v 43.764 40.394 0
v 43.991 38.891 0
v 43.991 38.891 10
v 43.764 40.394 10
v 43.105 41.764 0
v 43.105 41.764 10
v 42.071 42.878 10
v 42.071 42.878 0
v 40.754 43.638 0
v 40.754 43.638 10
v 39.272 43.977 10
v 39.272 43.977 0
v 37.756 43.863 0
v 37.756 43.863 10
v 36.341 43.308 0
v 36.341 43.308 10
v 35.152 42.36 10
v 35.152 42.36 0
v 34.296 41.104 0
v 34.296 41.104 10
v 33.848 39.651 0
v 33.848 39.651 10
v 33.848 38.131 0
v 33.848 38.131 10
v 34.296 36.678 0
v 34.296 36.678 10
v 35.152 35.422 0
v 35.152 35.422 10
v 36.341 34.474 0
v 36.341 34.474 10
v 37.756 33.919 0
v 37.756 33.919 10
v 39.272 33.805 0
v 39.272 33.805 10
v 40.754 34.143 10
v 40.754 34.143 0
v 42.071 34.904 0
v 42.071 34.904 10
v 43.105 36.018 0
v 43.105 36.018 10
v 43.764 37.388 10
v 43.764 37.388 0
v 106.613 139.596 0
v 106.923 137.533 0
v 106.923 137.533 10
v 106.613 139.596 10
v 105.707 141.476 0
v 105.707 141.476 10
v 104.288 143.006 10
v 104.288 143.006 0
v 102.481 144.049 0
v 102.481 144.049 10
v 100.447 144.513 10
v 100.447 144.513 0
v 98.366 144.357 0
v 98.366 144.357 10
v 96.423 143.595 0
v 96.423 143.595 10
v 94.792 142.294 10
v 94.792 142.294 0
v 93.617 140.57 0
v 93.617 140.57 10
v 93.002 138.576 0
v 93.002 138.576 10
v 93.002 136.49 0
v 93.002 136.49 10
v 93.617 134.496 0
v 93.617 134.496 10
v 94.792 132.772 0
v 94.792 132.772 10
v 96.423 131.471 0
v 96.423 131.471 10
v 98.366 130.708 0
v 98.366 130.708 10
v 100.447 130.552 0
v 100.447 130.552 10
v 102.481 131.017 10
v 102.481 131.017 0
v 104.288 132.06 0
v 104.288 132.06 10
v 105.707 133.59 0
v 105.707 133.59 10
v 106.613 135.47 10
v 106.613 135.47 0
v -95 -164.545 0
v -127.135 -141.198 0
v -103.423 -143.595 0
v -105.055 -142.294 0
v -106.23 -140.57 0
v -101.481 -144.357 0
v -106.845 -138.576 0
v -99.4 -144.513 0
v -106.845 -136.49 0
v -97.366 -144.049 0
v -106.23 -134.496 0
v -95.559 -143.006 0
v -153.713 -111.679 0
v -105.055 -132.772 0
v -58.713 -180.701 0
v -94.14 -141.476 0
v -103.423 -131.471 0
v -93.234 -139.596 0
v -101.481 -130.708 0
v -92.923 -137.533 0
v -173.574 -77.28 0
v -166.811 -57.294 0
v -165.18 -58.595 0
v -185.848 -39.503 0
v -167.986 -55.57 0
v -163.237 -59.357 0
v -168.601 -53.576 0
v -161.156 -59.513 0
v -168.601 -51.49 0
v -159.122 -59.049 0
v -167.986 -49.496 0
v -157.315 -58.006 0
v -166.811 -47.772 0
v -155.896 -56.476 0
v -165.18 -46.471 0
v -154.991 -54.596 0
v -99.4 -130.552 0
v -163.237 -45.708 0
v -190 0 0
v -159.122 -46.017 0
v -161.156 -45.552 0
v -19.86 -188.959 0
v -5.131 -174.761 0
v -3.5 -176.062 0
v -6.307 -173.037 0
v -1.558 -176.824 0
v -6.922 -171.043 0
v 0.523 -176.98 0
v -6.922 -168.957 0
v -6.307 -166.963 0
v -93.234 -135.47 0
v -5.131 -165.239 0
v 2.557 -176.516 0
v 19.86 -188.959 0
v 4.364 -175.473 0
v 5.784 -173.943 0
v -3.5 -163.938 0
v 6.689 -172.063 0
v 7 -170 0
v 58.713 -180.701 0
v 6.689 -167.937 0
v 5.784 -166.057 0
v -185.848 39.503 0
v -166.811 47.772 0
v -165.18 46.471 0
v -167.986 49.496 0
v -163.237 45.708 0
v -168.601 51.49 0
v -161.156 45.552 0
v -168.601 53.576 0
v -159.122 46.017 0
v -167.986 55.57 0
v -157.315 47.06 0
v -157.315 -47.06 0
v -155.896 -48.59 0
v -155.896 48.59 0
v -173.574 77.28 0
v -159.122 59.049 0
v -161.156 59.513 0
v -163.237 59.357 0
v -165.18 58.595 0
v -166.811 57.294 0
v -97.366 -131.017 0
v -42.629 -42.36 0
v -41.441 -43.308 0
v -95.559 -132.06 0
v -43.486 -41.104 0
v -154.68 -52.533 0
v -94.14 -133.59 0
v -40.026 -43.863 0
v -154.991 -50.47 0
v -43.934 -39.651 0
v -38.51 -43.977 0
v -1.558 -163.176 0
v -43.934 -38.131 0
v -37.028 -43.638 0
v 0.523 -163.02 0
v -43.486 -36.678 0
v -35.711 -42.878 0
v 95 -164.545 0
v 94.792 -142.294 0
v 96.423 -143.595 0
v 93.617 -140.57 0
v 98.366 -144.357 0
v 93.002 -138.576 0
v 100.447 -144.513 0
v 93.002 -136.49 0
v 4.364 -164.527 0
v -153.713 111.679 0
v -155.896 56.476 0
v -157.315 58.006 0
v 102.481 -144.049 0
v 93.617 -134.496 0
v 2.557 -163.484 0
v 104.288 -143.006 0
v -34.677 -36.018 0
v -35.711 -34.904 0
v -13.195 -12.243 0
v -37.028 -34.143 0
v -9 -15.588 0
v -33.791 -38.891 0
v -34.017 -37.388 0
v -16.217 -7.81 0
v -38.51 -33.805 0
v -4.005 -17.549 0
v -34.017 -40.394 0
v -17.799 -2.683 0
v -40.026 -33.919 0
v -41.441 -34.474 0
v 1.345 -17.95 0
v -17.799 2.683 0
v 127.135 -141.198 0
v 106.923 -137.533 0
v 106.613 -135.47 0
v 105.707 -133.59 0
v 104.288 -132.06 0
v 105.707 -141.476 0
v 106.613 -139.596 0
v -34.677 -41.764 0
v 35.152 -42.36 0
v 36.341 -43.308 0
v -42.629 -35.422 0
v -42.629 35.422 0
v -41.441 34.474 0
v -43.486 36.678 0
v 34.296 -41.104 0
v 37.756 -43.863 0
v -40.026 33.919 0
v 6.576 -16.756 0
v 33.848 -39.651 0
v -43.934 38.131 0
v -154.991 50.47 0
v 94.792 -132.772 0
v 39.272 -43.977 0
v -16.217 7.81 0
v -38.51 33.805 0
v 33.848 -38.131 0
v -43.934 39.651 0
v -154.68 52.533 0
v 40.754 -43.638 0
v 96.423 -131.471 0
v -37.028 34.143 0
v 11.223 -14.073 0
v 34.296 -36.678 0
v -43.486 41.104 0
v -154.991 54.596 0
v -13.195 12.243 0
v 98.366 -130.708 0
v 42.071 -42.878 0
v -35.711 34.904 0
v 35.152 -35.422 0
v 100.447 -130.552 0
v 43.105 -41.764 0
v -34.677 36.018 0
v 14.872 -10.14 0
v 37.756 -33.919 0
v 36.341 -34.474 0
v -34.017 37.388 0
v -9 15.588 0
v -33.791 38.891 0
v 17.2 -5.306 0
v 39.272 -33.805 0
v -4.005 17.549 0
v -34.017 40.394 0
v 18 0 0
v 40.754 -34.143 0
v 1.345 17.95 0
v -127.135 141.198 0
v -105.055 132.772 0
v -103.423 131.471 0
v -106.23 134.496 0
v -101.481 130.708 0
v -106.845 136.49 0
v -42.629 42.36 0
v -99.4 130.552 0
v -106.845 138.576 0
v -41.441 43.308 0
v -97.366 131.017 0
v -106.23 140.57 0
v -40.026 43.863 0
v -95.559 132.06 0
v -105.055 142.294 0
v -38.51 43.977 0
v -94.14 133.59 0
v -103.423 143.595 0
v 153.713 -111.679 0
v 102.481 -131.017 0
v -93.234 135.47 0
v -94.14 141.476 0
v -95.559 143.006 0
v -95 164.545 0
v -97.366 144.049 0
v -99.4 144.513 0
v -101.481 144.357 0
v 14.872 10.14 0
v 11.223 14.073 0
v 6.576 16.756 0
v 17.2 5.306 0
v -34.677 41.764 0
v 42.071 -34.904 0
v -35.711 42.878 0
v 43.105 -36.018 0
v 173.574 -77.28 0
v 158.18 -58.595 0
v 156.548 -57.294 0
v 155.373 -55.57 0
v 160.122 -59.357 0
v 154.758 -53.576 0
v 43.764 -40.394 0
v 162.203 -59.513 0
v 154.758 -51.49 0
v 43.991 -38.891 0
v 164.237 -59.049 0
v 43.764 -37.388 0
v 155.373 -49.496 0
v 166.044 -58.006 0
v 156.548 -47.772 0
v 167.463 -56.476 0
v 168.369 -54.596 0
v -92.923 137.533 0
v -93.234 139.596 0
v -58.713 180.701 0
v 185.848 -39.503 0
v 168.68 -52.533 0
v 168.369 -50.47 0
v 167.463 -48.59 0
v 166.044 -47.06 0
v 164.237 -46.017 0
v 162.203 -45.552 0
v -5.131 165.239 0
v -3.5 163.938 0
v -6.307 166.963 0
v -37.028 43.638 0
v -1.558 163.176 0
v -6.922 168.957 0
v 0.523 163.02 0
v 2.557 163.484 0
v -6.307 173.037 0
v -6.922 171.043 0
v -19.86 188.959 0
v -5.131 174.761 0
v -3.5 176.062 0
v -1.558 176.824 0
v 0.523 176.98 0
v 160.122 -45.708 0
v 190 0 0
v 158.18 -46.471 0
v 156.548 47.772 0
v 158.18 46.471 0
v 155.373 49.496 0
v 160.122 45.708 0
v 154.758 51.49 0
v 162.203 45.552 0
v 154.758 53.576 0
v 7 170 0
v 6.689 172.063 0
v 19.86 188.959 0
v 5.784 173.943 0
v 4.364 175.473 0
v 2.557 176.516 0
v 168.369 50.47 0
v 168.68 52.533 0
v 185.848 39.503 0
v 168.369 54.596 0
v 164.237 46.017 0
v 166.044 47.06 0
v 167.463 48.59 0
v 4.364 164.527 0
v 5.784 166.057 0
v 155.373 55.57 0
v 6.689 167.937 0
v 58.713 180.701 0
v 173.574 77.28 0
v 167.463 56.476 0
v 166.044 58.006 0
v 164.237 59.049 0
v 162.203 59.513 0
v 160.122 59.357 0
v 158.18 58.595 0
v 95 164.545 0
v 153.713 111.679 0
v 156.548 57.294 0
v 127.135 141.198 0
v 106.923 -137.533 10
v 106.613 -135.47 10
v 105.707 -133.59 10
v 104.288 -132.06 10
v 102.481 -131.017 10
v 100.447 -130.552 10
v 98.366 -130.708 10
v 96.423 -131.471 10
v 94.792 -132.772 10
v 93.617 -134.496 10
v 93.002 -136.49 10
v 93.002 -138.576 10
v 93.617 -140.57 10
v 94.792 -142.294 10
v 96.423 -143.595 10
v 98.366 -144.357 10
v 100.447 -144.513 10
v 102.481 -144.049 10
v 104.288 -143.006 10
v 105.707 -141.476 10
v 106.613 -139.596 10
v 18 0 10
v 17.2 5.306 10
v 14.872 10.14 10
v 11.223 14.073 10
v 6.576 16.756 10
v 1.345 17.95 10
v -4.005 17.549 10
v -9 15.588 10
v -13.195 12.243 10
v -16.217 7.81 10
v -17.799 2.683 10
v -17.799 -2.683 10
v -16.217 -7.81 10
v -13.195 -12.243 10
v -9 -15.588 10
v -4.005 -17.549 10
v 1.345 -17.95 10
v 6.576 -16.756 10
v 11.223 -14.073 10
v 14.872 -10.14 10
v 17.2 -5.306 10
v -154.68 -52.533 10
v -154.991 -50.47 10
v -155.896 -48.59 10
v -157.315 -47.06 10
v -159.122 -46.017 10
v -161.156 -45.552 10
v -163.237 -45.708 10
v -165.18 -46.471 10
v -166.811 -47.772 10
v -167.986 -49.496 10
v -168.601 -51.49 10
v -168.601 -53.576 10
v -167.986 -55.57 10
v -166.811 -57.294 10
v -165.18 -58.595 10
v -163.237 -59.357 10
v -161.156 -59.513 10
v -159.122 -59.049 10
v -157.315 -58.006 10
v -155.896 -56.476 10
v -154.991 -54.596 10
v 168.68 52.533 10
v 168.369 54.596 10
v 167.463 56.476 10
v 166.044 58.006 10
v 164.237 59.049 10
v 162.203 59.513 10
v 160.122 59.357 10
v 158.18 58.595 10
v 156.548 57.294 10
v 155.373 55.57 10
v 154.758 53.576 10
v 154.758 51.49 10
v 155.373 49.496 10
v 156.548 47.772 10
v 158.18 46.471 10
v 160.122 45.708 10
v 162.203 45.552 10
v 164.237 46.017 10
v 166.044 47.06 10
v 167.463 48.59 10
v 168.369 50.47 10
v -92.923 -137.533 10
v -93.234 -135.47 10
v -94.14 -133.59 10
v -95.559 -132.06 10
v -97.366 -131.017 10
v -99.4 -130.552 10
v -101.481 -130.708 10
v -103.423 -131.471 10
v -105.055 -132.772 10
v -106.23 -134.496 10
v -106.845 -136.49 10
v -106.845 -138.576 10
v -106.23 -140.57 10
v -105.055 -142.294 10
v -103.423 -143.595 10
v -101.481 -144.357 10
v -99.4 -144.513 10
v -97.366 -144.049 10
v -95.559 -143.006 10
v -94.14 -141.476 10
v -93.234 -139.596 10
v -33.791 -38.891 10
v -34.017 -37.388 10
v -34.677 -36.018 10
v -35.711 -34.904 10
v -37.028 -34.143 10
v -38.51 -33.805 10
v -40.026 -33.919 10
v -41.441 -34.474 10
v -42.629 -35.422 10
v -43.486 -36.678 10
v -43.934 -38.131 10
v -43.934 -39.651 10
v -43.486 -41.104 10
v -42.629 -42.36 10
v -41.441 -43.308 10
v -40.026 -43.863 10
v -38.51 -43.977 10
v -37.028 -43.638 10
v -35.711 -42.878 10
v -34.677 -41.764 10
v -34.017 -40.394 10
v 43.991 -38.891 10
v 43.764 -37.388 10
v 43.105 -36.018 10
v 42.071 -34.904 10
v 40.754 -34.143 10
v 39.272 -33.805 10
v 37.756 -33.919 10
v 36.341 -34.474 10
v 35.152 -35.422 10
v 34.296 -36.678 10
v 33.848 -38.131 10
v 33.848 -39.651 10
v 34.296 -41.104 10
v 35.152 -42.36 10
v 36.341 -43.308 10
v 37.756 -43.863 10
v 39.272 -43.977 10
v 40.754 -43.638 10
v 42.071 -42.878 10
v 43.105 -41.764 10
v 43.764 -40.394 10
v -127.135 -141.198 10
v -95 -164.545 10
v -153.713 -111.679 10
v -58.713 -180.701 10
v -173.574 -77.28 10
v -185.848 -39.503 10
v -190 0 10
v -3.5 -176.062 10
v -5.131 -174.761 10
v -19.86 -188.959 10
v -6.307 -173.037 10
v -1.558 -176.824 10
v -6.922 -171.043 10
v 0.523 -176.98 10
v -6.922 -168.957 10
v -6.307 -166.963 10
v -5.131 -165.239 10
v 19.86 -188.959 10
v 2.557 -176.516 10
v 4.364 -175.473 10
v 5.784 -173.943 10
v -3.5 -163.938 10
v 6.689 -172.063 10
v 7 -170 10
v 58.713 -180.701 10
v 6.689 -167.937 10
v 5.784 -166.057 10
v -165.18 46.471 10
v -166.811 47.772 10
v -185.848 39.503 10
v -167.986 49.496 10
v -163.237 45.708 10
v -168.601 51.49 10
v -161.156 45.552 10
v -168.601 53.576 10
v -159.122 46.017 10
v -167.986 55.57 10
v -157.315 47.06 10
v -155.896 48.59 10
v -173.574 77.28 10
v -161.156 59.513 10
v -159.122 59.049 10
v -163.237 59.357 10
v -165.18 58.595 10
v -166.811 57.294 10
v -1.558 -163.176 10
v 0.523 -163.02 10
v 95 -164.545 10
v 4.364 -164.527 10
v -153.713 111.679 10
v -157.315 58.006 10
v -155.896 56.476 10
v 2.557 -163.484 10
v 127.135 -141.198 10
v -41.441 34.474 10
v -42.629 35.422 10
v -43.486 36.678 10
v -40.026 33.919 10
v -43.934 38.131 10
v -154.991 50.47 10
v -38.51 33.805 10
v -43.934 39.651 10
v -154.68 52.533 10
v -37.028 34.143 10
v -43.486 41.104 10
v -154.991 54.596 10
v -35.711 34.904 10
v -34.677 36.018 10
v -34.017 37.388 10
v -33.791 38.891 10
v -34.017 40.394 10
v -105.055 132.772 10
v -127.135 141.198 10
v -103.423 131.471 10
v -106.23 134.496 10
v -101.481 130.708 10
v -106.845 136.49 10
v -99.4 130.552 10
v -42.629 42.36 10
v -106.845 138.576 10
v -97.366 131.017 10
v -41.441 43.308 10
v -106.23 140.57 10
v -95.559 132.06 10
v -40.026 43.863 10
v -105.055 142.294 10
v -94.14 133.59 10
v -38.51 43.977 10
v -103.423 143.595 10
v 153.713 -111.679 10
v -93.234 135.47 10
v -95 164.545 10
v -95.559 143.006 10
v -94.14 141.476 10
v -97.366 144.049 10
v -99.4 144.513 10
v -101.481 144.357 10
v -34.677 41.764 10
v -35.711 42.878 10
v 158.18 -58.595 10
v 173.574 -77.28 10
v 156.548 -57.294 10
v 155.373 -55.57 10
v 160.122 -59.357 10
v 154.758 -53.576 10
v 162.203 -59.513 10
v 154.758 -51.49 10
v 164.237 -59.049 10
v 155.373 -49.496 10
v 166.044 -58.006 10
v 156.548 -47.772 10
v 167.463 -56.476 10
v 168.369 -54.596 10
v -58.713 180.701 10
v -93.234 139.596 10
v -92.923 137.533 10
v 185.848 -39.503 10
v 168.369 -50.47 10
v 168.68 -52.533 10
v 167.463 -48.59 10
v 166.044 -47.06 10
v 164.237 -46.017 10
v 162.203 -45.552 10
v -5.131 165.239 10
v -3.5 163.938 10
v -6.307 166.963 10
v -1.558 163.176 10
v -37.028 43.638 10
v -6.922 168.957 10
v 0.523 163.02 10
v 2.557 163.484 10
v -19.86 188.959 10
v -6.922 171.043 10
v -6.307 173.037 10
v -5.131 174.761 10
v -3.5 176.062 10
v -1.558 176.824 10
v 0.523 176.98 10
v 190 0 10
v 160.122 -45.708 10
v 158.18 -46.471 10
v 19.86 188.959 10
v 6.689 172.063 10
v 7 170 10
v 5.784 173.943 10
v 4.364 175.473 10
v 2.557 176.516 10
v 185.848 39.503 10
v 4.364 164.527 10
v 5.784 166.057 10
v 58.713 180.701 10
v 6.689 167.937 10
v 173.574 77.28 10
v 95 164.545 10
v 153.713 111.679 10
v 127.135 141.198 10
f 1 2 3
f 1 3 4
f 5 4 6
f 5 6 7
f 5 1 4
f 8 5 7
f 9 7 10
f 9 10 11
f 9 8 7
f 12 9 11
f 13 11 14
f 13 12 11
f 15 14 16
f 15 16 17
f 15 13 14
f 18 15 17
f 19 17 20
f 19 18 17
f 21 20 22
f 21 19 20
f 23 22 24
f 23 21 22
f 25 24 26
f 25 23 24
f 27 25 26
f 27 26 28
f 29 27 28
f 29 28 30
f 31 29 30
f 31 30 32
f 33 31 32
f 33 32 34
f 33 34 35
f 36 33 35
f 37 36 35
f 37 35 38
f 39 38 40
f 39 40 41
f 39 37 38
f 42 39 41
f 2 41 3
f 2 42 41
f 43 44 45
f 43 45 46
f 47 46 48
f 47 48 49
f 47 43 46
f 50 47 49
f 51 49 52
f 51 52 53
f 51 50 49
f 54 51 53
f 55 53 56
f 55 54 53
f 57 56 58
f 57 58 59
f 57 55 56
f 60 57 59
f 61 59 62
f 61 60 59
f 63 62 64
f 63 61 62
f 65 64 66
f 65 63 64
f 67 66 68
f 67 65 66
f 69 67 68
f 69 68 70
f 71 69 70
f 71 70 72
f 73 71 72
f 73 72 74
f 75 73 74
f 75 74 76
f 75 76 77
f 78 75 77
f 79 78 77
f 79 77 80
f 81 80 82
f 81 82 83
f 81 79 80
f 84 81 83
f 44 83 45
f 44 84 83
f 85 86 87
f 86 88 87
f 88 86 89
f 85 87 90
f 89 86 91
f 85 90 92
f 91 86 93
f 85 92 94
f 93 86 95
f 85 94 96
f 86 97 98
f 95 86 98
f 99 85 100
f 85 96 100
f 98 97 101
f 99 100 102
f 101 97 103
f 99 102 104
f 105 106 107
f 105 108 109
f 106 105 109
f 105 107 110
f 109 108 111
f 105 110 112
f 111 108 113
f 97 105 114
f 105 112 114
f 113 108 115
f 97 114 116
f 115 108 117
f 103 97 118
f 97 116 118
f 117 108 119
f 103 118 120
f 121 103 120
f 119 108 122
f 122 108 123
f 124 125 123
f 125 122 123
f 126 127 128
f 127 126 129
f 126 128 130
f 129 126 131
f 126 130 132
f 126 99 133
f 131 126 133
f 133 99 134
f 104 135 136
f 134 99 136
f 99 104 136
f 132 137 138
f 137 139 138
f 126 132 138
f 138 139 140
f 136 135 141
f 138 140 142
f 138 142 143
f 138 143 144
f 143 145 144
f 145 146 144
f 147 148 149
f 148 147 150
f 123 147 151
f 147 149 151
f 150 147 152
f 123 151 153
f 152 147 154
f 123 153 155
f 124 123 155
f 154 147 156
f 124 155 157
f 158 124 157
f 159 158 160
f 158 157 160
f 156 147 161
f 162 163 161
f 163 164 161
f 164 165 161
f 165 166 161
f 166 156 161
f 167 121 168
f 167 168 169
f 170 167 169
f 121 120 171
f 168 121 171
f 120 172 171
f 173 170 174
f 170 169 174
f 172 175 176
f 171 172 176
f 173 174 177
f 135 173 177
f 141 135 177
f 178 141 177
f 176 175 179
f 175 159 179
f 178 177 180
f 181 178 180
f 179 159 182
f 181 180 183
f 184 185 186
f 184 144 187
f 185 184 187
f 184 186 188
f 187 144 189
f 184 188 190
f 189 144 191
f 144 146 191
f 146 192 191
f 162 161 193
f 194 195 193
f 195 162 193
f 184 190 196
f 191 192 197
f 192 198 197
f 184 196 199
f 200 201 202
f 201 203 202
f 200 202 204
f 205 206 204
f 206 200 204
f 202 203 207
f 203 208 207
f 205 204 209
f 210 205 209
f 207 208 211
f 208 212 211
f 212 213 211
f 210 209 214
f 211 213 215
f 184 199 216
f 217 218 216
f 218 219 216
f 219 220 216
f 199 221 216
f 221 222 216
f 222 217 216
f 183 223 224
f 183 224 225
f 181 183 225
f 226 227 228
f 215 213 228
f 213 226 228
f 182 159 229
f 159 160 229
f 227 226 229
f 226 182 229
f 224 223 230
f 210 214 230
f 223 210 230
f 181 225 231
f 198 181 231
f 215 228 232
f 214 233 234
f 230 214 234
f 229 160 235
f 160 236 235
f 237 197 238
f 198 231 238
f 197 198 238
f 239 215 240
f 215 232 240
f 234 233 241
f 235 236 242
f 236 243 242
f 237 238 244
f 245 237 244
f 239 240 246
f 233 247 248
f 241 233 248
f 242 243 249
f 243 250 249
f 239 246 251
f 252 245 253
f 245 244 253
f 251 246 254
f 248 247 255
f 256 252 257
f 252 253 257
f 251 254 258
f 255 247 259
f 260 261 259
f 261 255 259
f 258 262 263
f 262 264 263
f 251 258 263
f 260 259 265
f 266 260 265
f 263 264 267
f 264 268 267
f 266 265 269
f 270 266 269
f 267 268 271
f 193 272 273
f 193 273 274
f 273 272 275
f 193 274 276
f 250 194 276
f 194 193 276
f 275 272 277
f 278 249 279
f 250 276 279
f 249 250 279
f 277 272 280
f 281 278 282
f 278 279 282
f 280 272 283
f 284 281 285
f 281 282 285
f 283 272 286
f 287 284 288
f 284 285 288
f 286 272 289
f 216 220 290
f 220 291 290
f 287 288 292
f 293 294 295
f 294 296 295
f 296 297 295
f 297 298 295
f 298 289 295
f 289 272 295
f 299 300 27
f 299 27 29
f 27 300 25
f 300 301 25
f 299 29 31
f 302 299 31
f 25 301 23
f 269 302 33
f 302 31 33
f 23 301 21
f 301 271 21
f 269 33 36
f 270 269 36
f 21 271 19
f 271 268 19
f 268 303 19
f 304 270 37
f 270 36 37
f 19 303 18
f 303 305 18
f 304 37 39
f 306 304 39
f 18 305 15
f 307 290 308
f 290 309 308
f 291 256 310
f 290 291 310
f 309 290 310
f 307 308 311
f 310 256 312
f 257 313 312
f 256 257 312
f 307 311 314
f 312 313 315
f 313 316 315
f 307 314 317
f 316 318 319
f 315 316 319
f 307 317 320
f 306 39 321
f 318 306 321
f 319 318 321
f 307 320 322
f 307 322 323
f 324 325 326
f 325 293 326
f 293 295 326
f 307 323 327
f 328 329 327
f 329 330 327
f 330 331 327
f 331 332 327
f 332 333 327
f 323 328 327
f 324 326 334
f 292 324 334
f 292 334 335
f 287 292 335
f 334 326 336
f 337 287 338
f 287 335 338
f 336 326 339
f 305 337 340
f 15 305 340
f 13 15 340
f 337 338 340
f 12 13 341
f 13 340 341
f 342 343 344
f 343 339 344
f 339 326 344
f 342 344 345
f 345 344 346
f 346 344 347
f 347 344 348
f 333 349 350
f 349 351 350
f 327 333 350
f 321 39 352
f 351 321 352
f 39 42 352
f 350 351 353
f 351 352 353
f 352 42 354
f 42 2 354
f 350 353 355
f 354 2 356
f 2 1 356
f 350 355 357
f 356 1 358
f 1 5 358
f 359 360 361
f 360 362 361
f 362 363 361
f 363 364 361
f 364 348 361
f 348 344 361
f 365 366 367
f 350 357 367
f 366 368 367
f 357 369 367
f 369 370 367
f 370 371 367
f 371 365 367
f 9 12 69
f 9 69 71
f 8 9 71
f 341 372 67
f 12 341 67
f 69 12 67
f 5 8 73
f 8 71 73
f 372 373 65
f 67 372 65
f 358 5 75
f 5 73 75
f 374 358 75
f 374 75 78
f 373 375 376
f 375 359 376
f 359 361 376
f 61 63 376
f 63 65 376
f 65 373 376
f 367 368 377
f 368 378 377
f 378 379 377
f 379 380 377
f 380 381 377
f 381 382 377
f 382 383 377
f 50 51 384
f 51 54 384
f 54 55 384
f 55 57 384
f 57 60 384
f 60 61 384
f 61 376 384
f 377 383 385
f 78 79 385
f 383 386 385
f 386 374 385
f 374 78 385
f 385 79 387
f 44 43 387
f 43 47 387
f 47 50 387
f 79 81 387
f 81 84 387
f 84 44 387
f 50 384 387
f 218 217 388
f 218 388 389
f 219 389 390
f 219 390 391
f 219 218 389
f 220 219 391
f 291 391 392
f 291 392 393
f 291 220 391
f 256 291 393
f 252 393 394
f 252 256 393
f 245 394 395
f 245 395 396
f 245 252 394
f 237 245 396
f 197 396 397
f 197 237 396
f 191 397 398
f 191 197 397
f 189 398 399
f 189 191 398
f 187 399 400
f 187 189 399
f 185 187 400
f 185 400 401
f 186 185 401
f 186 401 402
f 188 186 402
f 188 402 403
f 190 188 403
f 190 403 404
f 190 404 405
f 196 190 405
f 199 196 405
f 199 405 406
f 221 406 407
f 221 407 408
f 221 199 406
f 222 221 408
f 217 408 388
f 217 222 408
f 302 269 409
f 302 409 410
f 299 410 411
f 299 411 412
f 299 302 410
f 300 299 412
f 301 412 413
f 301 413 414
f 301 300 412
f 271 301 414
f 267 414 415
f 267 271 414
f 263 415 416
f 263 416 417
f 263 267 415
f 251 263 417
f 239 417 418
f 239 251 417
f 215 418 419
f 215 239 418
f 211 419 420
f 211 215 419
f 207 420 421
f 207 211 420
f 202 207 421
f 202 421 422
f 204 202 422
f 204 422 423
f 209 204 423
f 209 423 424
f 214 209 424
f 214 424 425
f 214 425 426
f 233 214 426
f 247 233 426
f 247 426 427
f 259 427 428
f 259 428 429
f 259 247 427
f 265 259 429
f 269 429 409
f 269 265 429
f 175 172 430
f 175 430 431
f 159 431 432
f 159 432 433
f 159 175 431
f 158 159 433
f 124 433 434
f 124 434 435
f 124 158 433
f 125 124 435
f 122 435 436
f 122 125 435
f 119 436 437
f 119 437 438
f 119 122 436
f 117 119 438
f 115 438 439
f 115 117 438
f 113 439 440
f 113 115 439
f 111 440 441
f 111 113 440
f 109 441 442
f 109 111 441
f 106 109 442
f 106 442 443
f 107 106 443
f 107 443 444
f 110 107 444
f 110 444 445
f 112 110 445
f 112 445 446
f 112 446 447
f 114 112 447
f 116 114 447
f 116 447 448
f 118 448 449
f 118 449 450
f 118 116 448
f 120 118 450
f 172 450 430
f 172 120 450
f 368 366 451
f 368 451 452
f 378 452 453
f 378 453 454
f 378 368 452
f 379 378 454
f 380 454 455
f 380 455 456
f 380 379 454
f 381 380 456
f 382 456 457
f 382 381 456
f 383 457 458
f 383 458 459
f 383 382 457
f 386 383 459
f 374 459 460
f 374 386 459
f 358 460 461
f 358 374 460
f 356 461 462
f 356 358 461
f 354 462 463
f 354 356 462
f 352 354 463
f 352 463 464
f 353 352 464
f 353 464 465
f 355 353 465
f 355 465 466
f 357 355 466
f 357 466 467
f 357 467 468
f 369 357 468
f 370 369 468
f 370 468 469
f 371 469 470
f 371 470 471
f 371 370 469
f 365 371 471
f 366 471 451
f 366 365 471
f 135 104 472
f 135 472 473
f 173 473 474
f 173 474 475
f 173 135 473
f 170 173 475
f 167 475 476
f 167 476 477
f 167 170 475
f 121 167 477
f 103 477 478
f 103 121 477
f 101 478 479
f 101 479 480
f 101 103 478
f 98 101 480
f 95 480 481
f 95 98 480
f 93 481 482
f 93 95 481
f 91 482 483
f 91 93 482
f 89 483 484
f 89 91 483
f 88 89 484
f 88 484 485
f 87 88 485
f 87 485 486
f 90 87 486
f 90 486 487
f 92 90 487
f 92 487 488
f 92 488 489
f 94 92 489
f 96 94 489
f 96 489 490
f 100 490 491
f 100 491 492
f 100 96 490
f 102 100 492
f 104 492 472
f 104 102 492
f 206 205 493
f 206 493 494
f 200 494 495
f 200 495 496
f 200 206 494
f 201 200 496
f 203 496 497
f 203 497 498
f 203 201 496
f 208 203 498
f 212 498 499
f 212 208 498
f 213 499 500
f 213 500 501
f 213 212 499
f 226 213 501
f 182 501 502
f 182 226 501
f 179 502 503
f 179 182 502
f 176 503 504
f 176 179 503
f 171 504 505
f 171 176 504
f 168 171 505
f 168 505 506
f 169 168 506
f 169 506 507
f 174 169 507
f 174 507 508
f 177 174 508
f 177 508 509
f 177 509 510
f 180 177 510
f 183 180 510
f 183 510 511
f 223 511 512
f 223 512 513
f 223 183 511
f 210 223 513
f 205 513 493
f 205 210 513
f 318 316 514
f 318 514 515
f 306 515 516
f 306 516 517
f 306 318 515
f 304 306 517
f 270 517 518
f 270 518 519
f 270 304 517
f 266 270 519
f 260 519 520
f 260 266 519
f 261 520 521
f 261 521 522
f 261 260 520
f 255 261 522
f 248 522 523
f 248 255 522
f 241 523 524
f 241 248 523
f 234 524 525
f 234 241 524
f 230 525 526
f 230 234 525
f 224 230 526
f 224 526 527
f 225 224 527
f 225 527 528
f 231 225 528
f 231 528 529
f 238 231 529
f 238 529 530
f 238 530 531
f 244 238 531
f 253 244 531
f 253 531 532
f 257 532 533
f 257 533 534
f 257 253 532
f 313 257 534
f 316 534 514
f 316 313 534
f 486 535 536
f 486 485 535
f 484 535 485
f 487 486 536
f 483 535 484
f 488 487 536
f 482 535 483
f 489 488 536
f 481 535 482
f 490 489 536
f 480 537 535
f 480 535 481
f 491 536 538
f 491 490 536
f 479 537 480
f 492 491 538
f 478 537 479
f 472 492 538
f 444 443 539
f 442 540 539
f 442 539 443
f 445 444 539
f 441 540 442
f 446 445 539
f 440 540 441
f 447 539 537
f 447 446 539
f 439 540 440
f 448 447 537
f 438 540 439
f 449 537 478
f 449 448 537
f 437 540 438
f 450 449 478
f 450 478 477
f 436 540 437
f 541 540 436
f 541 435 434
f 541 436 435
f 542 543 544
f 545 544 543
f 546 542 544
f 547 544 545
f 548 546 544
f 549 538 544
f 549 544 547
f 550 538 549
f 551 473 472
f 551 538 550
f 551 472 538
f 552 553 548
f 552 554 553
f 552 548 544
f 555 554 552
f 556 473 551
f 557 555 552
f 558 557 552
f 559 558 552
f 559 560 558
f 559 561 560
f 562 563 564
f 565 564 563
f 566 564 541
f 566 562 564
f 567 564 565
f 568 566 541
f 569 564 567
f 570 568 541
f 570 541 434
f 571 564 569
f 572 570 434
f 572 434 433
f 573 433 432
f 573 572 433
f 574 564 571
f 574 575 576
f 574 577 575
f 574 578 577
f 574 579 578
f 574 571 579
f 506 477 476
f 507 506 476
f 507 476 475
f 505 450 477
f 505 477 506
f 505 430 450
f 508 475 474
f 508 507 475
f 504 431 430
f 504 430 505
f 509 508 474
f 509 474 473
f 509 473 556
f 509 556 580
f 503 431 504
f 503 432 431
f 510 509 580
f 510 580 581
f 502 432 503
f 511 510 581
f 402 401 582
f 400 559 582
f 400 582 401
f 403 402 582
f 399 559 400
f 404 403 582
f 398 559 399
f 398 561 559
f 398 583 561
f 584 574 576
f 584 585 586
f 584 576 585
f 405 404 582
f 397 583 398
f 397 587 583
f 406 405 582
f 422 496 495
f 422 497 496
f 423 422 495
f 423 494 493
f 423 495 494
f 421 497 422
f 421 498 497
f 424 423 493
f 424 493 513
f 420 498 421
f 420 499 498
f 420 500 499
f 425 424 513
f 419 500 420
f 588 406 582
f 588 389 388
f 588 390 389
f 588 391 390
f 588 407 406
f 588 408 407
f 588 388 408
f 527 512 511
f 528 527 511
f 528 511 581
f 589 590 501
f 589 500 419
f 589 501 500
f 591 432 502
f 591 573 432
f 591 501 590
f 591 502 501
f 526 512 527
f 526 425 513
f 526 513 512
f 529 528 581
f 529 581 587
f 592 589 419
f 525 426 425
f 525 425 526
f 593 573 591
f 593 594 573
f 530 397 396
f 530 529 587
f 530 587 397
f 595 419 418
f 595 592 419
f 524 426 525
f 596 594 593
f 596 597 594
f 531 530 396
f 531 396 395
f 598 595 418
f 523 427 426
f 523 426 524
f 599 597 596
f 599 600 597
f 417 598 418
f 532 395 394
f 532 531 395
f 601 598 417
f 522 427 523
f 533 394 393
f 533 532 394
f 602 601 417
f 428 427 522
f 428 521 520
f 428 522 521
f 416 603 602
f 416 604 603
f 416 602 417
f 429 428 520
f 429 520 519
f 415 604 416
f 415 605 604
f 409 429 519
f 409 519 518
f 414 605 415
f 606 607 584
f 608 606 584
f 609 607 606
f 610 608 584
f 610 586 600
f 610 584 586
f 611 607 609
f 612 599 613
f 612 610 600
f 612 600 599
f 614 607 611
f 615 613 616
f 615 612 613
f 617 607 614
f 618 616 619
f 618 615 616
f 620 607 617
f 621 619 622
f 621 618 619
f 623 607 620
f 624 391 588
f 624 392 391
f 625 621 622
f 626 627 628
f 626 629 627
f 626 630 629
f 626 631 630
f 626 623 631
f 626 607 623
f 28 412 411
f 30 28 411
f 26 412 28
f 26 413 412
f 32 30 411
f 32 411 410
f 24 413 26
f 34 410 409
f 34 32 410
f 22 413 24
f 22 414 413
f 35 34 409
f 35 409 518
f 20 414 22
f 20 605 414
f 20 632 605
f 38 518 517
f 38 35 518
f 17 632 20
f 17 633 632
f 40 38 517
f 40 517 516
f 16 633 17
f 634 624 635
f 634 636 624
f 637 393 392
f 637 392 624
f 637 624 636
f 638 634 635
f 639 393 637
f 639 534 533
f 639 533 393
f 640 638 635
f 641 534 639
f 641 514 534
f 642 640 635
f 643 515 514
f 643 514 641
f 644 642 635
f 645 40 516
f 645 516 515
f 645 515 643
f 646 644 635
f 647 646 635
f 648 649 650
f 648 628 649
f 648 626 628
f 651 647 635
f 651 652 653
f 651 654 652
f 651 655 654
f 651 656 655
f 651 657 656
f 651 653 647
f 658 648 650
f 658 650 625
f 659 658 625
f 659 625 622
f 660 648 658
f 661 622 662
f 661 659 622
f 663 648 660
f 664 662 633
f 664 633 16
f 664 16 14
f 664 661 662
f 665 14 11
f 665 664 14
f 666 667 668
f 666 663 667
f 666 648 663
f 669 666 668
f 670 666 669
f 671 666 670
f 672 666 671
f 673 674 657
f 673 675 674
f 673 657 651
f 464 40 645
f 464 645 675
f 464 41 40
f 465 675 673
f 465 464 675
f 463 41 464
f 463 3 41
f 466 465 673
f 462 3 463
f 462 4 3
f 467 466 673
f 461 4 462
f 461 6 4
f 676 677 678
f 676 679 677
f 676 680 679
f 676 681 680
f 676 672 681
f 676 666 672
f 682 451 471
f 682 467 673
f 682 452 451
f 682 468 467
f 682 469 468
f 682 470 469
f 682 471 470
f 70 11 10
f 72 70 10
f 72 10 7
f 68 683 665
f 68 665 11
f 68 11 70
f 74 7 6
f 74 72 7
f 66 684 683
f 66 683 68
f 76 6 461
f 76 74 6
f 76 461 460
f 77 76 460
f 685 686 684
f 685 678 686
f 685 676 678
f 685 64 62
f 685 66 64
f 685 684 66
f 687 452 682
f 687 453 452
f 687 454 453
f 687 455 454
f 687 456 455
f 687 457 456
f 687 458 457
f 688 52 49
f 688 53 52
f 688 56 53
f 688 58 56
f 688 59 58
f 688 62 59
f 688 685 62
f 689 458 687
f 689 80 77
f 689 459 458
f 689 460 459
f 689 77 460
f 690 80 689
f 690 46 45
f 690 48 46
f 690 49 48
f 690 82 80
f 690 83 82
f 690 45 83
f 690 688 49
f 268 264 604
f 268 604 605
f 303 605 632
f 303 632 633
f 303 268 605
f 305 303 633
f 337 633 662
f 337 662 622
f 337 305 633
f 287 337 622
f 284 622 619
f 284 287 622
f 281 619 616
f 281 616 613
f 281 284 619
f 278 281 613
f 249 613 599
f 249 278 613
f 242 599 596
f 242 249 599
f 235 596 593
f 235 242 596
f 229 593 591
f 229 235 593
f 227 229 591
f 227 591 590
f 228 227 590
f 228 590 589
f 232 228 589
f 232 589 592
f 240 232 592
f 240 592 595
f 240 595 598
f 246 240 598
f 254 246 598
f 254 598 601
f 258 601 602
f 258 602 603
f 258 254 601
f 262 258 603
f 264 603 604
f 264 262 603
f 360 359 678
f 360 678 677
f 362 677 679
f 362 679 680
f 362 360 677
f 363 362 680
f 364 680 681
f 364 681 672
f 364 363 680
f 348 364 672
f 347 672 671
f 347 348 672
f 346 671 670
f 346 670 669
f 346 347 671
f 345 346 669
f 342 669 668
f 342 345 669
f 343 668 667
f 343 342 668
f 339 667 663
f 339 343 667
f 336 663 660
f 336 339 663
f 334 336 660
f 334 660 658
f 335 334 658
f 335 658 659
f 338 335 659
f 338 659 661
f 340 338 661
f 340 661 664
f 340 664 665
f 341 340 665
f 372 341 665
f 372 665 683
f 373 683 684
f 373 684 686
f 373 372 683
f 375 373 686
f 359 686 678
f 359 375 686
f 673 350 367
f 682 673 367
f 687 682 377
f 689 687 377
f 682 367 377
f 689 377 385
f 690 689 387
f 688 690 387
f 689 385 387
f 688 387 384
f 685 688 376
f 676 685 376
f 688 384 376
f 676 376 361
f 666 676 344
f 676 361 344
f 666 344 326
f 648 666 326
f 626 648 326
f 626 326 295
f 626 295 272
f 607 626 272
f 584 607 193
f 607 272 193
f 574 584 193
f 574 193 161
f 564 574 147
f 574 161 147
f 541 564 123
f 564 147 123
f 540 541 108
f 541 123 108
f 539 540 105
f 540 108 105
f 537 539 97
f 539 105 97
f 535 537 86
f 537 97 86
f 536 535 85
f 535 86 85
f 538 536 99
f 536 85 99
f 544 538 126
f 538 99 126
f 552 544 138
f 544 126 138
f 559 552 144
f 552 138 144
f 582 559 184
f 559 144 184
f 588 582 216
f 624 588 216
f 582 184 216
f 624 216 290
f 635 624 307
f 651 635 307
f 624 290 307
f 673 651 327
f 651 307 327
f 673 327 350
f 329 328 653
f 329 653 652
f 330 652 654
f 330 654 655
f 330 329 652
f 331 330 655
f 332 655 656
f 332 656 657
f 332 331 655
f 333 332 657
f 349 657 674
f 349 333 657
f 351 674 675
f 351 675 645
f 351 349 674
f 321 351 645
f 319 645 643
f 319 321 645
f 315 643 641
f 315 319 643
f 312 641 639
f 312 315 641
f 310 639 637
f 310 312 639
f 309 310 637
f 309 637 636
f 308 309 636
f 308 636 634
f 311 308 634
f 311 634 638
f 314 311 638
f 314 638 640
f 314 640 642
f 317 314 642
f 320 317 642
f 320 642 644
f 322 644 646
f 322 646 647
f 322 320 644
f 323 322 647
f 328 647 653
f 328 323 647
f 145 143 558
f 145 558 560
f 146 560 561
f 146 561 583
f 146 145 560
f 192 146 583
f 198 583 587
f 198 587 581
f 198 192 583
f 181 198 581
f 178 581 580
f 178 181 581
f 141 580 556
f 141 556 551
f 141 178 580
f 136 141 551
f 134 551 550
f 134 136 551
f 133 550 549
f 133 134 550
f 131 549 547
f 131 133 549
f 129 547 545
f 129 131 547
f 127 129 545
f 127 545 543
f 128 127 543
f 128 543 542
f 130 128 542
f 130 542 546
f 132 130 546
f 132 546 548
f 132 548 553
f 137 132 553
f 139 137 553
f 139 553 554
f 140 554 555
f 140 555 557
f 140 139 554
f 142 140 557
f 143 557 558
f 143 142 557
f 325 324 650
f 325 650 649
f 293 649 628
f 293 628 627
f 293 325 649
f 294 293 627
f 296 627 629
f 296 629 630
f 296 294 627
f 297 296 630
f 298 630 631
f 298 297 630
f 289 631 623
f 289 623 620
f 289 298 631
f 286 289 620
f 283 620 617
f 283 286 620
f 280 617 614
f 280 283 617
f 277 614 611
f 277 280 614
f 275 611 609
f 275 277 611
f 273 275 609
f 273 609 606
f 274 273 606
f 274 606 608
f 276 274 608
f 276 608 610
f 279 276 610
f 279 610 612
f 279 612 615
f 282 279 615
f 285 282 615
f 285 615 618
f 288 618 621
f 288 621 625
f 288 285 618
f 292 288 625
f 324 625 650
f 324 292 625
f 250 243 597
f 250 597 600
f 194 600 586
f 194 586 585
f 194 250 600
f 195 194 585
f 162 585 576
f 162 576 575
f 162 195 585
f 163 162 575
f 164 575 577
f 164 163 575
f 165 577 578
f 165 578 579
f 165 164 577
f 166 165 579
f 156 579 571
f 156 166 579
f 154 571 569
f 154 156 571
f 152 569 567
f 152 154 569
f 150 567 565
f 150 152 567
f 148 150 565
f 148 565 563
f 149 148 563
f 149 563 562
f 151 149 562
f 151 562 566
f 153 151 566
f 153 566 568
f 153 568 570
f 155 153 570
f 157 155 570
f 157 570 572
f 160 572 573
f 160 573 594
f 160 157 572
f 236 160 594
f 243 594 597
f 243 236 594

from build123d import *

# Parameters (mm, degrees)
IZIM1_R                     = 190
IZIM1_R_2                   = 7
IZIM1_R_3                   = 18
IZIM1_R_4                   = 5.1
Y_KSEKLIK_EKSTR_ZYON1_DEPTH = 10


with BuildPart() as part:
    # Çizim1 → Yükseklik-Ekstrüzyon1 (new body)
    with BuildSketch(Plane.XY):
        Circle(IZIM1_R)
        with Locations((0, 170)):
            Circle(IZIM1_R_2, mode=Mode.SUBTRACT)
        with Locations((-99.92349289, 137.532889044)):
            Circle(IZIM1_R_2, mode=Mode.SUBTRACT)
        with Locations((-161.67960777, 52.532889044)):
            Circle(IZIM1_R_2, mode=Mode.SUBTRACT)
        with Locations((-161.67960777, -52.532889044)):
            Circle(IZIM1_R_2, mode=Mode.SUBTRACT)
        with Locations((-99.92349289, -137.532889044)):
            Circle(IZIM1_R_2, mode=Mode.SUBTRACT)
        with Locations((0, -170)):
            Circle(IZIM1_R_2, mode=Mode.SUBTRACT)
        with Locations((99.92349289, -137.532889044)):
            Circle(IZIM1_R_2, mode=Mode.SUBTRACT)
        with Locations((161.67960777, -52.532889044)):
            Circle(IZIM1_R_2, mode=Mode.SUBTRACT)
        with Locations((161.67960777, 52.532889044)):
            Circle(IZIM1_R_2, mode=Mode.SUBTRACT)
        with Locations((99.92349289, 137.532889044)):
            Circle(IZIM1_R_2, mode=Mode.SUBTRACT)
        Circle(IZIM1_R_3, mode=Mode.SUBTRACT)
        with Locations((-38.890872965, 38.890872965)):
            Circle(IZIM1_R_4, mode=Mode.SUBTRACT)
        with Locations((38.890872965, 38.890872965)):
            Circle(IZIM1_R_4, mode=Mode.SUBTRACT)
        with Locations((38.890872965, -38.890872965)):
            Circle(IZIM1_R_4, mode=Mode.SUBTRACT)
        with Locations((-38.890872965, -38.890872965)):
            Circle(IZIM1_R_4, mode=Mode.SUBTRACT)
    extrude(amount=Y_KSEKLIK_EKSTR_ZYON1_DEPTH)


solid = part.part
